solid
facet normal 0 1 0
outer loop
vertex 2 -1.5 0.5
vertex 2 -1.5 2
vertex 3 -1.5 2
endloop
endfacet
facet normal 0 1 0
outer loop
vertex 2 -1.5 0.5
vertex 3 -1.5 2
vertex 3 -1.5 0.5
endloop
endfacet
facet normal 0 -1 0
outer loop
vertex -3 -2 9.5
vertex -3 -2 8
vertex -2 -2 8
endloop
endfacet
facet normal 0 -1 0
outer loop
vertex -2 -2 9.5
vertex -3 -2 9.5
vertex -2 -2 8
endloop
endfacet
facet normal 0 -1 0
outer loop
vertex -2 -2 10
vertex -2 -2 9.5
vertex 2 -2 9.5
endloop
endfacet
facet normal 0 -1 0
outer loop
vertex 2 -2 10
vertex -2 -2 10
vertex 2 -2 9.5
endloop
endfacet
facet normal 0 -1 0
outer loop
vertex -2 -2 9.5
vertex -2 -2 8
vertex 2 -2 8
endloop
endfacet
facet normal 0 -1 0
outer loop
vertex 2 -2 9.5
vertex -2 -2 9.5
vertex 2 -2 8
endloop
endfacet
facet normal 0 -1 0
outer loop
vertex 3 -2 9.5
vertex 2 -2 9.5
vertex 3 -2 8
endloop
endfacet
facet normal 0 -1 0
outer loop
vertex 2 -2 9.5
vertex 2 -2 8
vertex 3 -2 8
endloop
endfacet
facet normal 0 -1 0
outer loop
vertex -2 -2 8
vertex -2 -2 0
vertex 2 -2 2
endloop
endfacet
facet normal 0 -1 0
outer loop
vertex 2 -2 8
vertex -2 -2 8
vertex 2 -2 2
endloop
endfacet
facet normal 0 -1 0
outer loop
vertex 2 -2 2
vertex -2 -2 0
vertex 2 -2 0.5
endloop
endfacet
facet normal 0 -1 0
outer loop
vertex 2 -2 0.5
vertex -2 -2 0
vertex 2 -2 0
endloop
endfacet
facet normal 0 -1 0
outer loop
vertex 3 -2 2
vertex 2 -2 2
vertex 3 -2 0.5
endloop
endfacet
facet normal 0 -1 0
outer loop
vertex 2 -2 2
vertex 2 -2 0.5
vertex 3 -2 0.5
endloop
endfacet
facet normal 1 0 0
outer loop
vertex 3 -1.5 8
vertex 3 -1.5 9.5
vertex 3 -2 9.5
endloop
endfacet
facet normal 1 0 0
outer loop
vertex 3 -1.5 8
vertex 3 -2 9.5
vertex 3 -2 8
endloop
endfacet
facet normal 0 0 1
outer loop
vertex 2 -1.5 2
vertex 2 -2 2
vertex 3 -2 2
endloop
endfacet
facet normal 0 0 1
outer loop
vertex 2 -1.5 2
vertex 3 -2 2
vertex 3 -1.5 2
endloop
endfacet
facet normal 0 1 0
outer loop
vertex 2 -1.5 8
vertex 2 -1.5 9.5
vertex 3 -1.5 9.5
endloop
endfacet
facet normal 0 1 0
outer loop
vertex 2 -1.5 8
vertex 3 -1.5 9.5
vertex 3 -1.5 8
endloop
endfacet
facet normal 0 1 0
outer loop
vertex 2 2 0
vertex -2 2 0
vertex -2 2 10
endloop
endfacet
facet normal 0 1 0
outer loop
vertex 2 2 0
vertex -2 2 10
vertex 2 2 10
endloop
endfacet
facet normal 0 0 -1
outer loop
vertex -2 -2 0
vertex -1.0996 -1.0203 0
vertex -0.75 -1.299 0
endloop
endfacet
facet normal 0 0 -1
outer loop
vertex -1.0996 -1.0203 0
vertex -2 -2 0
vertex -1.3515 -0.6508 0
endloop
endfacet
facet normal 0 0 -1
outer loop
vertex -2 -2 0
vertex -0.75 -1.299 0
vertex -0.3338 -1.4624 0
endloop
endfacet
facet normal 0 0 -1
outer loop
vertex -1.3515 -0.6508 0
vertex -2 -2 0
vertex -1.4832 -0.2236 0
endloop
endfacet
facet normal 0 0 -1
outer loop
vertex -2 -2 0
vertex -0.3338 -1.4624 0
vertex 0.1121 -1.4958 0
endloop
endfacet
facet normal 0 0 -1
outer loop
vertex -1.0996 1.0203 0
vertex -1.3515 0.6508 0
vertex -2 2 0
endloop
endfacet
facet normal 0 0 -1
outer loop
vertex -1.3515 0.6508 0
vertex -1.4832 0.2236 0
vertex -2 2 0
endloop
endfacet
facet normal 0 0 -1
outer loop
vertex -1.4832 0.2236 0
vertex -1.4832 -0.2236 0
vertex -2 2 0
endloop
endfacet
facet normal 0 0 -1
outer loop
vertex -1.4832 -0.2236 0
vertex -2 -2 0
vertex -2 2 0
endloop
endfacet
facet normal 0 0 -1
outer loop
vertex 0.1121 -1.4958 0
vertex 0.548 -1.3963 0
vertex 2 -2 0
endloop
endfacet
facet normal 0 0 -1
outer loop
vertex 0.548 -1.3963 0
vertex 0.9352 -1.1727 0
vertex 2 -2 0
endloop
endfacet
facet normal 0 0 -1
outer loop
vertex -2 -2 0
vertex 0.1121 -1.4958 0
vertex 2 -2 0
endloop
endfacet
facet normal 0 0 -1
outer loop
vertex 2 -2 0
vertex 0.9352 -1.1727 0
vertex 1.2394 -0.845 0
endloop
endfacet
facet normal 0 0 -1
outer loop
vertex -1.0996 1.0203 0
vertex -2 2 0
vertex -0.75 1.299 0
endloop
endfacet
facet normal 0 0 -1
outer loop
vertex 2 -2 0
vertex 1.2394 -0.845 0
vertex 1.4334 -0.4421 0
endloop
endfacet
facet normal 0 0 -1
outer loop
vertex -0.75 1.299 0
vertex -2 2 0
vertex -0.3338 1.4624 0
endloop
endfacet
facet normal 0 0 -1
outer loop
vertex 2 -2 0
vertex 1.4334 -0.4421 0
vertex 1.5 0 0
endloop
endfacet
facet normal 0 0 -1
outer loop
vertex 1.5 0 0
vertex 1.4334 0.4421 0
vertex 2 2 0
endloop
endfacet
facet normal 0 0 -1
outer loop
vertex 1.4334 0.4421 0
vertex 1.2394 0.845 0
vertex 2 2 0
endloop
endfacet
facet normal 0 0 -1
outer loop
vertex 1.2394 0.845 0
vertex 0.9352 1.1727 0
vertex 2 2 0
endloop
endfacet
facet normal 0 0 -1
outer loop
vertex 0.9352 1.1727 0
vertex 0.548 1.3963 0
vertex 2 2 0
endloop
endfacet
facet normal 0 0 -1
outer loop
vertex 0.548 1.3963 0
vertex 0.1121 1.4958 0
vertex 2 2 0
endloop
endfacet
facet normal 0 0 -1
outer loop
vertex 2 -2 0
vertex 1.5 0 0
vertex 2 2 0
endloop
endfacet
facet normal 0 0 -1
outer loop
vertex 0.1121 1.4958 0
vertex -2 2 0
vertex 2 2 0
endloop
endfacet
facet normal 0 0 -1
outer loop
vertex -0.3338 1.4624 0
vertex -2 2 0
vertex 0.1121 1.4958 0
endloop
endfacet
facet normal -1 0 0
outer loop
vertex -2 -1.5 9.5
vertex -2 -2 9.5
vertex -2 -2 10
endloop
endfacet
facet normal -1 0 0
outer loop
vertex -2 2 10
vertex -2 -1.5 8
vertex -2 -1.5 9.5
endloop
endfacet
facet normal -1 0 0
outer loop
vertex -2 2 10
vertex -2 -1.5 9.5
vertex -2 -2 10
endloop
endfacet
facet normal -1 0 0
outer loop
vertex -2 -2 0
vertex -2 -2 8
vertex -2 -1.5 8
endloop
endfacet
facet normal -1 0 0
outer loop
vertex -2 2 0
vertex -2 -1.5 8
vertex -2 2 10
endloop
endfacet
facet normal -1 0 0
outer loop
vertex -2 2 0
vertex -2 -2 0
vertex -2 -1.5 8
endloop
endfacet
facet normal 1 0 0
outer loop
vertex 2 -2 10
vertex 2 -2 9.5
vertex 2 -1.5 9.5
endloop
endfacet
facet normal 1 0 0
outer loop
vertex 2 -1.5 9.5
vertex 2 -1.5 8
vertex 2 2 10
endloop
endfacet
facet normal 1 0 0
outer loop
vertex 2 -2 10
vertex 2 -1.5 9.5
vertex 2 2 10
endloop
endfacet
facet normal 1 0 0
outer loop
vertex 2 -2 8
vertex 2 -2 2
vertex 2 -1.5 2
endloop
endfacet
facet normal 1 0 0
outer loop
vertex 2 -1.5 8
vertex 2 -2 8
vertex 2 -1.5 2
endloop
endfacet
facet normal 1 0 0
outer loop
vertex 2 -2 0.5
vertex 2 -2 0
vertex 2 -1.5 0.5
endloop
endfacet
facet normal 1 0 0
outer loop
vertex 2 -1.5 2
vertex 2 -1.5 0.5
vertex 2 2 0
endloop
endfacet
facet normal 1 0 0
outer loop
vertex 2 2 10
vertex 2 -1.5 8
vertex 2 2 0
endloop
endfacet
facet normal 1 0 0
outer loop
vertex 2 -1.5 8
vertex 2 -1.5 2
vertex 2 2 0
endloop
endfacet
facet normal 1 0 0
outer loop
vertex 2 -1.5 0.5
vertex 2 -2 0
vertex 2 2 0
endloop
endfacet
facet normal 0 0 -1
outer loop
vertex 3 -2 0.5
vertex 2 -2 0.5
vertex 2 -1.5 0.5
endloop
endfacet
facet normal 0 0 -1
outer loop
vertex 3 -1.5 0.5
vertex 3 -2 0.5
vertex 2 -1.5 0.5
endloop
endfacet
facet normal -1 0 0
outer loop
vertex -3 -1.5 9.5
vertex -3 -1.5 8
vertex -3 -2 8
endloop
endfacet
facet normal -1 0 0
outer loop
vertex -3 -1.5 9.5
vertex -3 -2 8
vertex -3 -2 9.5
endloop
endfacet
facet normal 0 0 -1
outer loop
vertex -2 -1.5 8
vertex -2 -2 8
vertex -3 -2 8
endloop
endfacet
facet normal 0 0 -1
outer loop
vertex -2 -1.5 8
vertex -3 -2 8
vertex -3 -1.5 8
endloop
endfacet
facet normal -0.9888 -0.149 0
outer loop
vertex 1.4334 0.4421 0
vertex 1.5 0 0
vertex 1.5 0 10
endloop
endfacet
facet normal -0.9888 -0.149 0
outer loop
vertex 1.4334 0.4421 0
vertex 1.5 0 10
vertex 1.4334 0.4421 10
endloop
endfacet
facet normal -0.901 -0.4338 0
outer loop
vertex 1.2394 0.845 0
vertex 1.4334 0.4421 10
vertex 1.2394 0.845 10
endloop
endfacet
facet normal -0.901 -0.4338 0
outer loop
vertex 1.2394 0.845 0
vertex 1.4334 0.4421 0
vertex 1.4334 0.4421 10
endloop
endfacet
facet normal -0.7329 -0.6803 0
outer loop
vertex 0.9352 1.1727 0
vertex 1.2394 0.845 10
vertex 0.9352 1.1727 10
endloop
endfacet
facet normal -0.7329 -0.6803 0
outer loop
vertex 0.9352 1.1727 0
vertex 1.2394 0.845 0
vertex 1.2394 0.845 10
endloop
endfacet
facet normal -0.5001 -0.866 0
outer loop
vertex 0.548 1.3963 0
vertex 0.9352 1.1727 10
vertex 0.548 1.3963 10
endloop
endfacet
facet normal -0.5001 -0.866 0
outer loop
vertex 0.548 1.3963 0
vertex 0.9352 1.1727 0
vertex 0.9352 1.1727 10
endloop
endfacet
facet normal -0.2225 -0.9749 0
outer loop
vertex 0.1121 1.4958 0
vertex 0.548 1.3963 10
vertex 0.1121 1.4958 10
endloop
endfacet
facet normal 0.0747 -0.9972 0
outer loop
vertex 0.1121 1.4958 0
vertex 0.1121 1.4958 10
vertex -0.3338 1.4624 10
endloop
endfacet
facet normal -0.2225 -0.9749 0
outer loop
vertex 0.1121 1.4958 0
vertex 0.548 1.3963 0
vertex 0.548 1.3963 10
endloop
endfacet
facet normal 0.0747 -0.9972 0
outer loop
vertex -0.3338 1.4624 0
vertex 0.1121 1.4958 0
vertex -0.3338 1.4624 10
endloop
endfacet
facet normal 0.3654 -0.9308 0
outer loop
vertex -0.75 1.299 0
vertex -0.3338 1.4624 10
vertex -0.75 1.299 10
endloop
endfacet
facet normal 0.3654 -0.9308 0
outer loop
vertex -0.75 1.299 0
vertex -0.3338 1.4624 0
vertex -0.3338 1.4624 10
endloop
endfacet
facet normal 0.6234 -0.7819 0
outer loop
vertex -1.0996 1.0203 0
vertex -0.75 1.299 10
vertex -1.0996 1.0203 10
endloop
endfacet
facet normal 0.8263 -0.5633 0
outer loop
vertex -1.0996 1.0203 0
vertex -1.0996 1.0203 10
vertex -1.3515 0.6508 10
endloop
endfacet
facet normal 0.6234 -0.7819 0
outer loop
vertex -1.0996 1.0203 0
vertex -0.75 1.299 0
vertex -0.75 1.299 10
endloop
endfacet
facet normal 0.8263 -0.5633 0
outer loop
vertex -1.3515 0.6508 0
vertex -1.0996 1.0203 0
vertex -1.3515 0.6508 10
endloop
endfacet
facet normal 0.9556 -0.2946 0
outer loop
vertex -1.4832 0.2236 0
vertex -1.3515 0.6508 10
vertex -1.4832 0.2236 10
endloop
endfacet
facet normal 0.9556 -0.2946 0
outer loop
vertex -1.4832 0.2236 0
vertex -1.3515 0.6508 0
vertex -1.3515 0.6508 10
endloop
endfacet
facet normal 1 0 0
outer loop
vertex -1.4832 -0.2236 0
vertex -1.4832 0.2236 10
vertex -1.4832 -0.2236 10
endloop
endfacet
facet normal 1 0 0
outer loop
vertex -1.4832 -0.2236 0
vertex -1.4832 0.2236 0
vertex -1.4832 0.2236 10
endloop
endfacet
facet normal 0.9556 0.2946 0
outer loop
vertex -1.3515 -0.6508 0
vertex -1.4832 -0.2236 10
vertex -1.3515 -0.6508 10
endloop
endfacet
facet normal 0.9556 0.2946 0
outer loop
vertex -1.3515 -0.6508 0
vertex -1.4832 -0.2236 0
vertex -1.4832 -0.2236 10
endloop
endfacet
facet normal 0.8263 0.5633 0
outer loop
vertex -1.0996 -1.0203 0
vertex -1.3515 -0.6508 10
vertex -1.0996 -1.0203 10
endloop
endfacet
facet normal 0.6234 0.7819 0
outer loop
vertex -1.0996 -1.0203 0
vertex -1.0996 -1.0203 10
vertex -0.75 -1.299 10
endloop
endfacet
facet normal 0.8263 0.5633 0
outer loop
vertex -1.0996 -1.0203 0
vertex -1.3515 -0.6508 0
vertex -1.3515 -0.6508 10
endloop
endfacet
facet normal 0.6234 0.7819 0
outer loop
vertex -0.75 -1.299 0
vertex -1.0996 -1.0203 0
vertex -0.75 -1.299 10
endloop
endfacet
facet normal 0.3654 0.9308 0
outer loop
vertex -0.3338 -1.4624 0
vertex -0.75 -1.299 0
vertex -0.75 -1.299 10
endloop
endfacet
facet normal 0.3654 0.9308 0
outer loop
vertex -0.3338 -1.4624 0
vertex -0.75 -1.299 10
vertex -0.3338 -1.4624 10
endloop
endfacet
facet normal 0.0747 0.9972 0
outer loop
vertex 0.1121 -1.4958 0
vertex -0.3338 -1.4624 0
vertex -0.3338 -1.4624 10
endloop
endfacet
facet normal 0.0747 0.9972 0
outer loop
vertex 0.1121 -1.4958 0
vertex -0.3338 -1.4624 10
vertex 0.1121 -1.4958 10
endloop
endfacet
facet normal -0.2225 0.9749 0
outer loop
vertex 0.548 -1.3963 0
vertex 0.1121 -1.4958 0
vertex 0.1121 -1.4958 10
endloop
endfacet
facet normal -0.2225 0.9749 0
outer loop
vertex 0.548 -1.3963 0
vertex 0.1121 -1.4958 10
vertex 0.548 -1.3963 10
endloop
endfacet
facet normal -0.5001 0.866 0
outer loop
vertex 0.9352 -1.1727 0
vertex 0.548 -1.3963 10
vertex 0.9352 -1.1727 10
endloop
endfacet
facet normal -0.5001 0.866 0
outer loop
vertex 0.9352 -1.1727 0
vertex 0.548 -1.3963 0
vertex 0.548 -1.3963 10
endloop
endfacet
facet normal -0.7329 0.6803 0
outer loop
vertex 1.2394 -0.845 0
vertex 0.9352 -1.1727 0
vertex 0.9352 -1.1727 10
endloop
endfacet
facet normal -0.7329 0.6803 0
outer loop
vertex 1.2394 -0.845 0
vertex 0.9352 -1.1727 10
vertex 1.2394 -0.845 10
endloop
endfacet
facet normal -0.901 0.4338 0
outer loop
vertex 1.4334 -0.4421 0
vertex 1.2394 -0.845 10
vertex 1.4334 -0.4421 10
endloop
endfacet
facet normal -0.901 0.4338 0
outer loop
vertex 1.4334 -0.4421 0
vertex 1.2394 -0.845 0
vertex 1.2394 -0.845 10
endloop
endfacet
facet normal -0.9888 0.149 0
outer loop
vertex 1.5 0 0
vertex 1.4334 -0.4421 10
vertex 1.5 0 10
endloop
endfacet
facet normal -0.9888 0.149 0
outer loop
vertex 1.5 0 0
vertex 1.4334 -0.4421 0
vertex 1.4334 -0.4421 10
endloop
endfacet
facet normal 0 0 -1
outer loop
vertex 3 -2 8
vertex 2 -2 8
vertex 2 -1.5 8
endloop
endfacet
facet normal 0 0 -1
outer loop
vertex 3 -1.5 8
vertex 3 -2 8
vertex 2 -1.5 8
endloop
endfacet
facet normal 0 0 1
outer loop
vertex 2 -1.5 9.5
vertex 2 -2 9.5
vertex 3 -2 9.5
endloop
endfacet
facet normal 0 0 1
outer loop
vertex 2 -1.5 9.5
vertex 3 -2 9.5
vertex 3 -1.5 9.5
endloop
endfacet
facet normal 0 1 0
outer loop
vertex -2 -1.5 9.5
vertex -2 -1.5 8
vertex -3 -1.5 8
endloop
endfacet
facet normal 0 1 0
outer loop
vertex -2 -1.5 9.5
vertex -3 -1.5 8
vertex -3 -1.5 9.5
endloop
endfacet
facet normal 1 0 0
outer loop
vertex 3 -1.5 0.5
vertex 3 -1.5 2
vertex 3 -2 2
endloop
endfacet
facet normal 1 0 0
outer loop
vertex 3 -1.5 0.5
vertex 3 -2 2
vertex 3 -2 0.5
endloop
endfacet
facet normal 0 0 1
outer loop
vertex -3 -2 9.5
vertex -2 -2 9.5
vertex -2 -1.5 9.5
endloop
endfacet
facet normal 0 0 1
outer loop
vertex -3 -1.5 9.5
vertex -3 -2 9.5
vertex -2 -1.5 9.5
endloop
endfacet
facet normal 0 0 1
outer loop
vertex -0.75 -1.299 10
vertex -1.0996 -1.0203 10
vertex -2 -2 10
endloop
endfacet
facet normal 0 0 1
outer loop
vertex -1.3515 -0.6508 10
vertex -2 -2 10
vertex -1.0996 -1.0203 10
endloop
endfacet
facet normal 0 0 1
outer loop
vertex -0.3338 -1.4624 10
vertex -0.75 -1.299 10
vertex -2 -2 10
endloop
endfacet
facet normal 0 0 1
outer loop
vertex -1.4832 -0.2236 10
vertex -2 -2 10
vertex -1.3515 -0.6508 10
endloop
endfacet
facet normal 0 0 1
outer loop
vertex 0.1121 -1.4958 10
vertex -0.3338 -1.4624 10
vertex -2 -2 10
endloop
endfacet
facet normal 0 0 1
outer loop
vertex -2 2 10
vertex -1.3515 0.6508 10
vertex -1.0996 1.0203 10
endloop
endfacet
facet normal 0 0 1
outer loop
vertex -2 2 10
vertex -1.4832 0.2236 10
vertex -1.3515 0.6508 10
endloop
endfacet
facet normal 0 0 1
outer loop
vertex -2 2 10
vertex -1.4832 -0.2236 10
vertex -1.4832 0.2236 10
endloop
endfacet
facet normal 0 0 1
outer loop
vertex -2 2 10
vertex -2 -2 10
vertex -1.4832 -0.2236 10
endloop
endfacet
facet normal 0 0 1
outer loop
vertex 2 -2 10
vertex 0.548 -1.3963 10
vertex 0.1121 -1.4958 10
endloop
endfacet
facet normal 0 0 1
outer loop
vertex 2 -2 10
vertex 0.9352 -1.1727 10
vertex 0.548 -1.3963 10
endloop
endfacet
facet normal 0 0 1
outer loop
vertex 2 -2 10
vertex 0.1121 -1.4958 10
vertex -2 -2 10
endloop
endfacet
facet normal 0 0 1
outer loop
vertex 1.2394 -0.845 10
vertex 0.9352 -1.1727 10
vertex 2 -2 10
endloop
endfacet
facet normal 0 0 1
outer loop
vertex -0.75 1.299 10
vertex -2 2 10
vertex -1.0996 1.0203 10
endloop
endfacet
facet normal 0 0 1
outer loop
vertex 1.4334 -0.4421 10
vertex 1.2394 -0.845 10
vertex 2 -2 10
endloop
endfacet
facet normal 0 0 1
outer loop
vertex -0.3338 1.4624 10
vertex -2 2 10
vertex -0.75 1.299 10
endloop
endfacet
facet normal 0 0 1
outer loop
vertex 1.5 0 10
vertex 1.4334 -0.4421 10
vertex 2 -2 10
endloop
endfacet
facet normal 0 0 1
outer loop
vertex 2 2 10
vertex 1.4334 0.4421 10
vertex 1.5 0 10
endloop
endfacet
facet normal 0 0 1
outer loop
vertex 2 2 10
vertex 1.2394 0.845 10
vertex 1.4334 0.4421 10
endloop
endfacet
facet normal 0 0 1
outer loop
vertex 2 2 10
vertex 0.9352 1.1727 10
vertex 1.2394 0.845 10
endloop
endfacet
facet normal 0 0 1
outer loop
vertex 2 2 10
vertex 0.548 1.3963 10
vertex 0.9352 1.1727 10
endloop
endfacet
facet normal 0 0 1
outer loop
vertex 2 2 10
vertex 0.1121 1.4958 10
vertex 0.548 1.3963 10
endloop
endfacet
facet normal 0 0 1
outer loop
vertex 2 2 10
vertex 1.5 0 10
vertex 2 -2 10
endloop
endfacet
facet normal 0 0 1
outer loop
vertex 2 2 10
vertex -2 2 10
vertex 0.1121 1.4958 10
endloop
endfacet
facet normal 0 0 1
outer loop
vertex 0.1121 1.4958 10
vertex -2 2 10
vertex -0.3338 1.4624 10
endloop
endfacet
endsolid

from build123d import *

# Parameters (mm, degrees)
SKETCH1_W           = 4
SKETCH1_H           = 4
SKETCH1_R           = 1.5
BOSS_EXTRUDE1_DEPTH = 10
SKETCH3_W           = 1.5
SKETCH3_H           = 0.5
BOSS_EXTRUDE2_DEPTH = 1
SKETCH4_W           = 1.5
SKETCH4_H           = 0.5
BOSS_EXTRUDE3_DEPTH = 1


with BuildPart() as part:
    # Sketch1 → Boss-Extrude1 (new body)
    with BuildSketch(Plane.XY):
        Rectangle(SKETCH1_W, SKETCH1_H)
        Circle(SKETCH1_R, mode=Mode.SUBTRACT)
    extrude(amount=BOSS_EXTRUDE1_DEPTH)

    # Sketch3 → Boss-Extrude2 (add)
    with BuildSketch(Plane(origin=(2, 0, 0), x_dir=(0, 0, -1), z_dir=(1, 0, 0))):
        with Locations((-8.75, -1.75)):
            Rectangle(SKETCH3_W, SKETCH3_H)
        with Locations((-1.25, -1.75)):
            Rectangle(SKETCH3_W, SKETCH3_H)
    extrude(amount=BOSS_EXTRUDE2_DEPTH)

    # Sketch4 → Boss-Extrude3 (add)
    with BuildSketch(Plane.ZY.offset(2)):
        with Locations((8.75, -1.75)):
            Rectangle(SKETCH4_W, SKETCH4_H)
    extrude(amount=BOSS_EXTRUDE3_DEPTH)


solid = part.part
